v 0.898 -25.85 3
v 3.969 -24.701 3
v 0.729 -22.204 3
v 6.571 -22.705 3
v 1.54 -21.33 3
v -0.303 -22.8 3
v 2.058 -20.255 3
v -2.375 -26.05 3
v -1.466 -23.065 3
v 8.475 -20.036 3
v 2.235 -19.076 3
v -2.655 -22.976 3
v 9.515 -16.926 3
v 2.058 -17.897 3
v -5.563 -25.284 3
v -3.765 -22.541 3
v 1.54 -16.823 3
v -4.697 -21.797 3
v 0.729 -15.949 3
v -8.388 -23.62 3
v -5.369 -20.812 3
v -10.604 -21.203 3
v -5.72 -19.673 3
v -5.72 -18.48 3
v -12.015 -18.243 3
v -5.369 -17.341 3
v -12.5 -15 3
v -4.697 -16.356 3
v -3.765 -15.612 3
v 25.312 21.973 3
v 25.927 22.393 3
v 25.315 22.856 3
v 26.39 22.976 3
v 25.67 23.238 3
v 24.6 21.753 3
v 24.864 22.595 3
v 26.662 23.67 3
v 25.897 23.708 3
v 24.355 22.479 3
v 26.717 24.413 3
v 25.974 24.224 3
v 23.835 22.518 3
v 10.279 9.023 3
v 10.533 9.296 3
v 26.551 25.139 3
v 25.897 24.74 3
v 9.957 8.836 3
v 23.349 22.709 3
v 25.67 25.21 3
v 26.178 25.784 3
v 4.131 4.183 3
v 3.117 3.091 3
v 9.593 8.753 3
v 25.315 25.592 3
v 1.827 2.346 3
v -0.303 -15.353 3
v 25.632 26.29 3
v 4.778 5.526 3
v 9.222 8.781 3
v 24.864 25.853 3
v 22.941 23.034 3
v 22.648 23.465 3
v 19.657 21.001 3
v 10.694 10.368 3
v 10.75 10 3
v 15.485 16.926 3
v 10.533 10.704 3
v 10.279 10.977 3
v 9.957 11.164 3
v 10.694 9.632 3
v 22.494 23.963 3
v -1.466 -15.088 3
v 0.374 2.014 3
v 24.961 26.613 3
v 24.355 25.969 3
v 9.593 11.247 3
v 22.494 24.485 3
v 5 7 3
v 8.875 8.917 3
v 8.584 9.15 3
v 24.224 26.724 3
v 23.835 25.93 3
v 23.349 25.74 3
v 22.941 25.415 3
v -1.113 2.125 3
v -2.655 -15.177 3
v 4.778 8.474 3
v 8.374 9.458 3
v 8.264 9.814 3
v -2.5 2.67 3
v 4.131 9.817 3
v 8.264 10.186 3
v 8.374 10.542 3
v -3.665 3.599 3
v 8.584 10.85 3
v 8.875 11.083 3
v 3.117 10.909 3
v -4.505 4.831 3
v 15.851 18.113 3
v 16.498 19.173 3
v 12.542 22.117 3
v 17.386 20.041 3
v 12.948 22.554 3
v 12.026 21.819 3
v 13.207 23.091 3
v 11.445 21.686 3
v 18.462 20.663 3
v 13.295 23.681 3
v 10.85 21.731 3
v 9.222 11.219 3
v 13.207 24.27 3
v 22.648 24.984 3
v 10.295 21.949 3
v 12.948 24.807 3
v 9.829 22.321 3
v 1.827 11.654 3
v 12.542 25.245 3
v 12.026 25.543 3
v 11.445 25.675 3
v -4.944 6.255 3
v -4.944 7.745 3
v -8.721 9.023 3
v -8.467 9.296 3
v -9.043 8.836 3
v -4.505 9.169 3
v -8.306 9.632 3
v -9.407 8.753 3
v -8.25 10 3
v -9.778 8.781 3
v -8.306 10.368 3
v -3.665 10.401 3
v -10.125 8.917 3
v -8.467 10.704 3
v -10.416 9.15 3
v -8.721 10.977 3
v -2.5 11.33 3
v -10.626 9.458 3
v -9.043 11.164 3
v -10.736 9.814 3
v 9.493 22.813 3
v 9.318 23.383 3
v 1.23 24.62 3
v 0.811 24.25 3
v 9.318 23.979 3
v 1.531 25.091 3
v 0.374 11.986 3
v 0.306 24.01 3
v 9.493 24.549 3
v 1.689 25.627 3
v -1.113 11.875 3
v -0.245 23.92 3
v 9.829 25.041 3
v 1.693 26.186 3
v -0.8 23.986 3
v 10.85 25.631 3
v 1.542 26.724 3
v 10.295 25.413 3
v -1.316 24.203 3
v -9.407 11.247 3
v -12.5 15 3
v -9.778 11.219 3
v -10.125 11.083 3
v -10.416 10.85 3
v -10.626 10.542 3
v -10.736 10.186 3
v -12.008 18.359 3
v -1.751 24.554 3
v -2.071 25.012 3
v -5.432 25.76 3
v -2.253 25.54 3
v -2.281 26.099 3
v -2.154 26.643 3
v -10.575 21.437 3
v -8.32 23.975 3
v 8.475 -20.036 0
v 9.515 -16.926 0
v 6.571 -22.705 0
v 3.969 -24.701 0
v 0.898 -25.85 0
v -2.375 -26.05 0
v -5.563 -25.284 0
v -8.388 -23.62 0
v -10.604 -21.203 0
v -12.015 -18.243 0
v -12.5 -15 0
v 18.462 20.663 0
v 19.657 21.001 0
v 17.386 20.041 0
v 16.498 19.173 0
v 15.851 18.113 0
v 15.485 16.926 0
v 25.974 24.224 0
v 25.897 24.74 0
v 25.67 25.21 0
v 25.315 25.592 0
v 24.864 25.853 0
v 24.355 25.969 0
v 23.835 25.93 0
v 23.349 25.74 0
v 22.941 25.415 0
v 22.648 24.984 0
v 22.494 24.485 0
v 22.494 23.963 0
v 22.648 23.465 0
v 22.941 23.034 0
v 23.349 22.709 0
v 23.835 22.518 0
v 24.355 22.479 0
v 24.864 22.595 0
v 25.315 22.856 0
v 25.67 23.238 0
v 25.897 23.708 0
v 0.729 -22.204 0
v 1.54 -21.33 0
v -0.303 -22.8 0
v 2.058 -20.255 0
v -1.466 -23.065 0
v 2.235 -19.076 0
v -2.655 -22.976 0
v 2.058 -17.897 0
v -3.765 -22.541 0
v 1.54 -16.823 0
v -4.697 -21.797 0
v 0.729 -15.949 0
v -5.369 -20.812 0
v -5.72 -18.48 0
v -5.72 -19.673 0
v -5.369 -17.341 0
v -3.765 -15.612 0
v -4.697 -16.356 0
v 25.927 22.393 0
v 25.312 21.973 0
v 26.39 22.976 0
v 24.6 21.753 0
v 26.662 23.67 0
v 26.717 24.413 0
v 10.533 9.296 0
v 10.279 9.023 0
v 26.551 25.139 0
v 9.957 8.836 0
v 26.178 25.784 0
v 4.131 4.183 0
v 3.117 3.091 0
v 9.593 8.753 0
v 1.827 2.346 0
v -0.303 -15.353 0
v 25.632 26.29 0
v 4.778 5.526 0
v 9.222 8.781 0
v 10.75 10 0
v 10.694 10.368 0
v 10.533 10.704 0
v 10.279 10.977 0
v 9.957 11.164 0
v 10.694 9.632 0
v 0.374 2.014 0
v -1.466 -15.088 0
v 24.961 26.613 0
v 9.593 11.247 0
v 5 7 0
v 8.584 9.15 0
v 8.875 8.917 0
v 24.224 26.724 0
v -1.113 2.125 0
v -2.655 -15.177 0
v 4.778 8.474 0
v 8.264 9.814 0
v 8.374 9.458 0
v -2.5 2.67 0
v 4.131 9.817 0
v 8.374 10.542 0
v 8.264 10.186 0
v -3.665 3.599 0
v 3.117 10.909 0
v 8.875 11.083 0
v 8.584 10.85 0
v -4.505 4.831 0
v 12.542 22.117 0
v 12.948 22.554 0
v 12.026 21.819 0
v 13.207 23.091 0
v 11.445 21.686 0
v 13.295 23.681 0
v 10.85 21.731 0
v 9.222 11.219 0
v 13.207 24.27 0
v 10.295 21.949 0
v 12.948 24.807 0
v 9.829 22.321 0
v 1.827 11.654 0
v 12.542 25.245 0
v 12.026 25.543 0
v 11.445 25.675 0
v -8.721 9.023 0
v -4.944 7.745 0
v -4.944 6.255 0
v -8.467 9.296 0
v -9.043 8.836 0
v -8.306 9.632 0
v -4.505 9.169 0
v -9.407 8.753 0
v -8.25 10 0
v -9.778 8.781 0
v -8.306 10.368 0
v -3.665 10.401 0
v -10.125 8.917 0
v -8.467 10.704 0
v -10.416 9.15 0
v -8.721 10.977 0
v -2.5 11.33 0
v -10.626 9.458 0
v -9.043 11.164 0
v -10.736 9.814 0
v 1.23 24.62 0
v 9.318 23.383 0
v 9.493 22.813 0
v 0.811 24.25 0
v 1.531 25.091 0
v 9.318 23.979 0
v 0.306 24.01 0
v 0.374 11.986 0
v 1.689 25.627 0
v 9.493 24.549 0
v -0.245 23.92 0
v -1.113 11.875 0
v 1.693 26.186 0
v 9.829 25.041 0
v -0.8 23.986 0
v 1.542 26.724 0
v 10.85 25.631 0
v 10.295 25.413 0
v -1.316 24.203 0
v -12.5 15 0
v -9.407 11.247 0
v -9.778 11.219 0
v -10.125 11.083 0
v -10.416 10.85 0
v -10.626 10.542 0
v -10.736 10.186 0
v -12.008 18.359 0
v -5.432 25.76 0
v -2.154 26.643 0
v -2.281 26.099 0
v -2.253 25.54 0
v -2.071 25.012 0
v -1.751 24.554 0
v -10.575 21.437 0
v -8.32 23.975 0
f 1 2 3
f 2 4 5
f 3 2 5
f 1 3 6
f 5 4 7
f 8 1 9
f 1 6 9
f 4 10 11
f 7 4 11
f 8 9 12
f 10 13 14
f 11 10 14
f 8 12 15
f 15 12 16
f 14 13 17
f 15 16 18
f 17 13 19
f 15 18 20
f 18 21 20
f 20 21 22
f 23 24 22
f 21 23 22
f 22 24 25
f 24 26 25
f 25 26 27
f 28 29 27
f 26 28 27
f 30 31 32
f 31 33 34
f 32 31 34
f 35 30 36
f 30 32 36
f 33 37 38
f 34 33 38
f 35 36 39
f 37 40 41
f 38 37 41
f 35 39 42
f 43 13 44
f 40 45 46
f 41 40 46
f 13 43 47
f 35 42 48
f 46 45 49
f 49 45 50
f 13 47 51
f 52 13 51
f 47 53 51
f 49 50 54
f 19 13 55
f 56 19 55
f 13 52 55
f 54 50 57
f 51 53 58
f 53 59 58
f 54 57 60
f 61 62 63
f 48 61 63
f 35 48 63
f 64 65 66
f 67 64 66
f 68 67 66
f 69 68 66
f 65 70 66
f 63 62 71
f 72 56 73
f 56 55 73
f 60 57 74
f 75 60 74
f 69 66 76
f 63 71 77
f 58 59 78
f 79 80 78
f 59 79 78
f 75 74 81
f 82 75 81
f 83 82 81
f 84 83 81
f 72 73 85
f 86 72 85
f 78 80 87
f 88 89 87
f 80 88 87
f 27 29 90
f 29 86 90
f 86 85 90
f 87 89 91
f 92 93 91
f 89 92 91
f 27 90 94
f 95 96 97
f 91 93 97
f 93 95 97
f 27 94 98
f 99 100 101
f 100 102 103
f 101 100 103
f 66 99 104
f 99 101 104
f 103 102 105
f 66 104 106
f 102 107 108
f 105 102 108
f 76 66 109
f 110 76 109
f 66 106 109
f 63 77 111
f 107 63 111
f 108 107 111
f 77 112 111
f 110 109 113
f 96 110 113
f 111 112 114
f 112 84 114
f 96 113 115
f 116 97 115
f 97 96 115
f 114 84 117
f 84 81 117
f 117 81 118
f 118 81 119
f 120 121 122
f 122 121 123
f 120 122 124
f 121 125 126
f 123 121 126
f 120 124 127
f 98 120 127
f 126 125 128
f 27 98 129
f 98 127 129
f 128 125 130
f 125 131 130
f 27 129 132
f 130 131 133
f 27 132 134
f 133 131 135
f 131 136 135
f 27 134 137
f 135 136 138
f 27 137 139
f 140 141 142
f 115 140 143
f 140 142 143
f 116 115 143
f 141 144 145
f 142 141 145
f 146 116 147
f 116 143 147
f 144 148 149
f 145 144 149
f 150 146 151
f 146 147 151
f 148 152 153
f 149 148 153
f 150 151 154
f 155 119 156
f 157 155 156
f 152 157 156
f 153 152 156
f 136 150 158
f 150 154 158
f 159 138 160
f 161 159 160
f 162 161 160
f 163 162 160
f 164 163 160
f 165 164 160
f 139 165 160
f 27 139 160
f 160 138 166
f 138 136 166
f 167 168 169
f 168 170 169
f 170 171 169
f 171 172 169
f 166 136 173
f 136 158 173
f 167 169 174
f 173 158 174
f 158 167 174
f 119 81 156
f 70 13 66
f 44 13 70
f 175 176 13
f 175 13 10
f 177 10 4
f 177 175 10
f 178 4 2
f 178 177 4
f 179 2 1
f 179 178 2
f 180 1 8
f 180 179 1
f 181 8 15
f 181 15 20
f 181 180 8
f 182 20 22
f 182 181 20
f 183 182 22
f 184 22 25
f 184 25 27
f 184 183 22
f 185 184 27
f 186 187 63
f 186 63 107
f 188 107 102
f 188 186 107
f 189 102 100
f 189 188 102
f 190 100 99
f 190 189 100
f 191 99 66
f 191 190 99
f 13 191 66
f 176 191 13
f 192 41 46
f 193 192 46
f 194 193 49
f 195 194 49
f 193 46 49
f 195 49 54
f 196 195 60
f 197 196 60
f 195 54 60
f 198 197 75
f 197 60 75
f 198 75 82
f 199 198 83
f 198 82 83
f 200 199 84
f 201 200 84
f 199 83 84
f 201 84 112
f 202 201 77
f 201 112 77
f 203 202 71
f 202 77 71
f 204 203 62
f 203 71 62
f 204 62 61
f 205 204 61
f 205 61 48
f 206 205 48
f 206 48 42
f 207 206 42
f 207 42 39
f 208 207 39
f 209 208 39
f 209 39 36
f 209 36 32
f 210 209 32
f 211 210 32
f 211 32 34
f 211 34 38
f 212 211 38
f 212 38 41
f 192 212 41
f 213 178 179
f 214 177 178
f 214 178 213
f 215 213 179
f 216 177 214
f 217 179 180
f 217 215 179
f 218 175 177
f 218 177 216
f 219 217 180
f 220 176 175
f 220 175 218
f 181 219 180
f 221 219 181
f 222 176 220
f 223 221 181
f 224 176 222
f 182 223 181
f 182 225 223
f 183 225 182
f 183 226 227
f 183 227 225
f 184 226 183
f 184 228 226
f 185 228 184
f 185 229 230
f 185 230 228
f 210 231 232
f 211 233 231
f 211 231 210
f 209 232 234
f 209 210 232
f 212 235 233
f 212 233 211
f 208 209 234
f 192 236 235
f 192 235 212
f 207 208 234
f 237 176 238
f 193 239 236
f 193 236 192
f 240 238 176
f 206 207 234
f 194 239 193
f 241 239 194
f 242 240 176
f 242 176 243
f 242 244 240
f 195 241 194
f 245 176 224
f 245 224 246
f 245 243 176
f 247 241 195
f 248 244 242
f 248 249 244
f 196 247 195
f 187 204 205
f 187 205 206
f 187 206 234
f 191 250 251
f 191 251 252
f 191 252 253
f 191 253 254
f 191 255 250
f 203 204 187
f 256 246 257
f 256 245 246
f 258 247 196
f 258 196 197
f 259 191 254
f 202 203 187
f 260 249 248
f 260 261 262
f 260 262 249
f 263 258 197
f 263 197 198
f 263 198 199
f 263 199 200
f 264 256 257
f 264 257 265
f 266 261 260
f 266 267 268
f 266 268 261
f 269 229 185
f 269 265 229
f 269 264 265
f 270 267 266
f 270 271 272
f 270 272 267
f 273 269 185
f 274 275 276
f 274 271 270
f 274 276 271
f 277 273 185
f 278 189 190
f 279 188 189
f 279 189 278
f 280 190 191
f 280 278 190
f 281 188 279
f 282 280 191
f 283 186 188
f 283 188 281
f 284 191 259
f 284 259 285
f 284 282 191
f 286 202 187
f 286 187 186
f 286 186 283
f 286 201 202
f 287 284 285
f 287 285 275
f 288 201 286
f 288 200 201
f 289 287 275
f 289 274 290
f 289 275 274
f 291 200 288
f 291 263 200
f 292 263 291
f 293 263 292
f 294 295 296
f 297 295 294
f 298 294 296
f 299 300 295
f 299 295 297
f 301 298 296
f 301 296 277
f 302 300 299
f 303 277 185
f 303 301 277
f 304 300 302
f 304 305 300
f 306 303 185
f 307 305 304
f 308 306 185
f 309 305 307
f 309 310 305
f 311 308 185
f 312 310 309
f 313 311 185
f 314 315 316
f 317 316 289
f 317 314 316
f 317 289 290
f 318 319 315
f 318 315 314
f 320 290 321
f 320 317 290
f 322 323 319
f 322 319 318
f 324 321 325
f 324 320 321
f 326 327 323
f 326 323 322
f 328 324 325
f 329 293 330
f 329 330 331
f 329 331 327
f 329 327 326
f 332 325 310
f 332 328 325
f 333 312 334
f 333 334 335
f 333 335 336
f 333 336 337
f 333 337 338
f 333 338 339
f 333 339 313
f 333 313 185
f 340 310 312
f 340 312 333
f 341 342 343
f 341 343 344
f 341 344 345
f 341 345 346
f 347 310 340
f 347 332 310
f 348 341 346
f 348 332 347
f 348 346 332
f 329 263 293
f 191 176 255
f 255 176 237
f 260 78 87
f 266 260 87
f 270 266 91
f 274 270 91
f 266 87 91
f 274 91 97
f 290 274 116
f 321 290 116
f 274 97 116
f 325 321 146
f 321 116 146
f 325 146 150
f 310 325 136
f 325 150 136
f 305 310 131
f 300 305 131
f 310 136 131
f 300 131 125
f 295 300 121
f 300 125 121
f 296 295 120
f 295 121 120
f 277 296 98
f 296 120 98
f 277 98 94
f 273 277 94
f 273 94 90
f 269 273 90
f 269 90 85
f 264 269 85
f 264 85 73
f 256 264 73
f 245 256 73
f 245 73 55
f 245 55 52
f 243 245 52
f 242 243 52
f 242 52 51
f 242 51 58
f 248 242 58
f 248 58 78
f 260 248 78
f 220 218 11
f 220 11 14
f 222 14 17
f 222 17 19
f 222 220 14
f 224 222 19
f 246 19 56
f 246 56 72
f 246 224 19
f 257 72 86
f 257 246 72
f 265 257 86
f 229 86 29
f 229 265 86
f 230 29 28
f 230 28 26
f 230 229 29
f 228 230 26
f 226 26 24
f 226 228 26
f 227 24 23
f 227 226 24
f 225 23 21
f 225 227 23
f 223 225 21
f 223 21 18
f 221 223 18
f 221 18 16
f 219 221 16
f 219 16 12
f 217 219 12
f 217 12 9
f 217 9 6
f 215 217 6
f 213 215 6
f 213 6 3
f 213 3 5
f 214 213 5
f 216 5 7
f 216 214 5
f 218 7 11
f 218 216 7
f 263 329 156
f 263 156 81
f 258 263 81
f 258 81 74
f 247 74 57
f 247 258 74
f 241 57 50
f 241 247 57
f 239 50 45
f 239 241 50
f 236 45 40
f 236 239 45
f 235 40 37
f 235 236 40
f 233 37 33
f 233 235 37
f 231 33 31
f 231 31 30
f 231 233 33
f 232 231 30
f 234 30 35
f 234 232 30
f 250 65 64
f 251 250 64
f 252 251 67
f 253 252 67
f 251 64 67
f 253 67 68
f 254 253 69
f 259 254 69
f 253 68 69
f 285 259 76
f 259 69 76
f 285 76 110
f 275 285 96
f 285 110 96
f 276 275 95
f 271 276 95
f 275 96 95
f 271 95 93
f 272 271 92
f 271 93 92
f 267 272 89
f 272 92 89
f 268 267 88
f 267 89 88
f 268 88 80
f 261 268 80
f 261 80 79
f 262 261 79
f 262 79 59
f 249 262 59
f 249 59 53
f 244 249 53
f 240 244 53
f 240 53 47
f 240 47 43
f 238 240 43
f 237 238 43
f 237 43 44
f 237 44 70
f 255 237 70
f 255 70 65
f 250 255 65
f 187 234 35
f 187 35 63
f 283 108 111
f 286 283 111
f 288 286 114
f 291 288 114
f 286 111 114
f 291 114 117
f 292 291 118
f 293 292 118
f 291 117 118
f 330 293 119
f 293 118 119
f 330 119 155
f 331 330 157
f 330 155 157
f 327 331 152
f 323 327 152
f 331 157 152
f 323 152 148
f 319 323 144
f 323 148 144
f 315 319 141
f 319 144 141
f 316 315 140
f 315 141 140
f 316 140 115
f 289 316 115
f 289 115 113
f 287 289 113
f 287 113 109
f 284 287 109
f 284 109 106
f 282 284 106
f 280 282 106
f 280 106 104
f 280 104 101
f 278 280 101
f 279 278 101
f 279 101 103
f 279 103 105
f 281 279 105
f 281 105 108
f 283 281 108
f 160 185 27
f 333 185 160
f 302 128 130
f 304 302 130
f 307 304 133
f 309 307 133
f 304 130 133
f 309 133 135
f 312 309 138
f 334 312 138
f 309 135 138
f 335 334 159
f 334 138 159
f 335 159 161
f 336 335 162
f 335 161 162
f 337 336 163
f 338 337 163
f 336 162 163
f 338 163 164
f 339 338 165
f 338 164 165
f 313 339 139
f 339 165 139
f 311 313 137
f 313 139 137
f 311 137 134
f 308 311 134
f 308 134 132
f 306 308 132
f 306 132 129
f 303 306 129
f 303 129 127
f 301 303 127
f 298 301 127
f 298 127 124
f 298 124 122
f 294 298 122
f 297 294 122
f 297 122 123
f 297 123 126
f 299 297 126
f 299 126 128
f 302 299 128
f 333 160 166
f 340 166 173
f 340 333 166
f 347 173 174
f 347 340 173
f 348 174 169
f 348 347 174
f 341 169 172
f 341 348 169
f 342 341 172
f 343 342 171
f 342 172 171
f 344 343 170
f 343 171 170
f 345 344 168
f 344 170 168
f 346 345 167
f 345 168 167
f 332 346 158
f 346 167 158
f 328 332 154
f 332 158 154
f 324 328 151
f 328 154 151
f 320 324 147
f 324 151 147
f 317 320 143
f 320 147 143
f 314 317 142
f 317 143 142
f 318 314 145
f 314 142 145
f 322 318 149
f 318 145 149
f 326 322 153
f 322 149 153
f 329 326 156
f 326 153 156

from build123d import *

# Parameters (mm, degrees)
SKETCH3_R           = 4
BOSS_EXTRUDE4_DEPTH = 3
SKETCH5_R           = 1.25
SKETCH5_R_2         = 5
CUT_EXTRUDE2_DEPTH  = 38.912717898
SKETCH6_R           = 1.75
CUT_EXTRUDE3_DEPTH  = 38.912717898
SKETCH8_R           = 2
CUT_EXTRUDE4_DEPTH  = 38.912717898


with BuildPart() as part:
    # Sketch3 → Boss-Extrude4 (new body)
    with BuildSketch(Plane.XY):
        with BuildLine():
            Line((-12.5, -15), (-12.5, 15))
            ThreePointArc((-12.5, 15), (-9.066038179, 23.290317201), (-0.775720978, 26.724279022))
            Line((-0.775720978, 26.724279022), (24.224279022, 26.724279022))
            ThreePointArc((24.224279022, 26.724279022), (26.717166406, 24.412726597), (24.600101889, 21.752689013))
            Line((24.600101889, 21.752689013), (19.656921871, 21.001043278))
            ThreePointArc((19.656921871, 21.001043278), (16.915054922, 19.634924783), (15.48452884, 16.926104149))
            Line((15.48452884, 16.926104149), (9.51547116, -16.926104149))
            ThreePointArc((9.51547116, -16.926104149), (-2.374739058, -26.049783342), (-12.5, -15))
        make_face()
        with Locations((-1.764648859, -19.076420455)):
            Circle(SKETCH3_R, mode=Mode.SUBTRACT)
    extrude(amount=BOSS_EXTRUDE4_DEPTH)

    # Sketch5 → Cut-Extrude2 (cut, through all)
    with BuildSketch(Plane.XY.offset(3)):
        with Locations((-9.5, 10)):
            Circle(SKETCH5_R)
        with Locations((9.5, 10)):
            Circle(SKETCH5_R)
        with Locations((0, 7)):
            Circle(SKETCH5_R_2)
    extrude(amount=-CUT_EXTRUDE2_DEPTH, mode=Mode.SUBTRACT)

    # Sketch6 → Cut-Extrude3 (cut, through all)
    with BuildSketch(Plane.XY.offset(3)):
        with Locations((24.224279022, 24.224279022)):
            Circle(SKETCH6_R)
    extrude(amount=-CUT_EXTRUDE3_DEPTH, mode=Mode.SUBTRACT)

    # Sketch8 → Cut-Extrude4 (cut, through all)
    with BuildSketch(Plane.XY.offset(3)):
        with Locations((11.295409365, 23.680851427)):
            Circle(SKETCH8_R)
        with Locations((-0.289384278, 25.919731906)):
            Circle(SKETCH8_R)
    extrude(amount=-CUT_EXTRUDE4_DEPTH, mode=Mode.SUBTRACT)


solid = part.part
